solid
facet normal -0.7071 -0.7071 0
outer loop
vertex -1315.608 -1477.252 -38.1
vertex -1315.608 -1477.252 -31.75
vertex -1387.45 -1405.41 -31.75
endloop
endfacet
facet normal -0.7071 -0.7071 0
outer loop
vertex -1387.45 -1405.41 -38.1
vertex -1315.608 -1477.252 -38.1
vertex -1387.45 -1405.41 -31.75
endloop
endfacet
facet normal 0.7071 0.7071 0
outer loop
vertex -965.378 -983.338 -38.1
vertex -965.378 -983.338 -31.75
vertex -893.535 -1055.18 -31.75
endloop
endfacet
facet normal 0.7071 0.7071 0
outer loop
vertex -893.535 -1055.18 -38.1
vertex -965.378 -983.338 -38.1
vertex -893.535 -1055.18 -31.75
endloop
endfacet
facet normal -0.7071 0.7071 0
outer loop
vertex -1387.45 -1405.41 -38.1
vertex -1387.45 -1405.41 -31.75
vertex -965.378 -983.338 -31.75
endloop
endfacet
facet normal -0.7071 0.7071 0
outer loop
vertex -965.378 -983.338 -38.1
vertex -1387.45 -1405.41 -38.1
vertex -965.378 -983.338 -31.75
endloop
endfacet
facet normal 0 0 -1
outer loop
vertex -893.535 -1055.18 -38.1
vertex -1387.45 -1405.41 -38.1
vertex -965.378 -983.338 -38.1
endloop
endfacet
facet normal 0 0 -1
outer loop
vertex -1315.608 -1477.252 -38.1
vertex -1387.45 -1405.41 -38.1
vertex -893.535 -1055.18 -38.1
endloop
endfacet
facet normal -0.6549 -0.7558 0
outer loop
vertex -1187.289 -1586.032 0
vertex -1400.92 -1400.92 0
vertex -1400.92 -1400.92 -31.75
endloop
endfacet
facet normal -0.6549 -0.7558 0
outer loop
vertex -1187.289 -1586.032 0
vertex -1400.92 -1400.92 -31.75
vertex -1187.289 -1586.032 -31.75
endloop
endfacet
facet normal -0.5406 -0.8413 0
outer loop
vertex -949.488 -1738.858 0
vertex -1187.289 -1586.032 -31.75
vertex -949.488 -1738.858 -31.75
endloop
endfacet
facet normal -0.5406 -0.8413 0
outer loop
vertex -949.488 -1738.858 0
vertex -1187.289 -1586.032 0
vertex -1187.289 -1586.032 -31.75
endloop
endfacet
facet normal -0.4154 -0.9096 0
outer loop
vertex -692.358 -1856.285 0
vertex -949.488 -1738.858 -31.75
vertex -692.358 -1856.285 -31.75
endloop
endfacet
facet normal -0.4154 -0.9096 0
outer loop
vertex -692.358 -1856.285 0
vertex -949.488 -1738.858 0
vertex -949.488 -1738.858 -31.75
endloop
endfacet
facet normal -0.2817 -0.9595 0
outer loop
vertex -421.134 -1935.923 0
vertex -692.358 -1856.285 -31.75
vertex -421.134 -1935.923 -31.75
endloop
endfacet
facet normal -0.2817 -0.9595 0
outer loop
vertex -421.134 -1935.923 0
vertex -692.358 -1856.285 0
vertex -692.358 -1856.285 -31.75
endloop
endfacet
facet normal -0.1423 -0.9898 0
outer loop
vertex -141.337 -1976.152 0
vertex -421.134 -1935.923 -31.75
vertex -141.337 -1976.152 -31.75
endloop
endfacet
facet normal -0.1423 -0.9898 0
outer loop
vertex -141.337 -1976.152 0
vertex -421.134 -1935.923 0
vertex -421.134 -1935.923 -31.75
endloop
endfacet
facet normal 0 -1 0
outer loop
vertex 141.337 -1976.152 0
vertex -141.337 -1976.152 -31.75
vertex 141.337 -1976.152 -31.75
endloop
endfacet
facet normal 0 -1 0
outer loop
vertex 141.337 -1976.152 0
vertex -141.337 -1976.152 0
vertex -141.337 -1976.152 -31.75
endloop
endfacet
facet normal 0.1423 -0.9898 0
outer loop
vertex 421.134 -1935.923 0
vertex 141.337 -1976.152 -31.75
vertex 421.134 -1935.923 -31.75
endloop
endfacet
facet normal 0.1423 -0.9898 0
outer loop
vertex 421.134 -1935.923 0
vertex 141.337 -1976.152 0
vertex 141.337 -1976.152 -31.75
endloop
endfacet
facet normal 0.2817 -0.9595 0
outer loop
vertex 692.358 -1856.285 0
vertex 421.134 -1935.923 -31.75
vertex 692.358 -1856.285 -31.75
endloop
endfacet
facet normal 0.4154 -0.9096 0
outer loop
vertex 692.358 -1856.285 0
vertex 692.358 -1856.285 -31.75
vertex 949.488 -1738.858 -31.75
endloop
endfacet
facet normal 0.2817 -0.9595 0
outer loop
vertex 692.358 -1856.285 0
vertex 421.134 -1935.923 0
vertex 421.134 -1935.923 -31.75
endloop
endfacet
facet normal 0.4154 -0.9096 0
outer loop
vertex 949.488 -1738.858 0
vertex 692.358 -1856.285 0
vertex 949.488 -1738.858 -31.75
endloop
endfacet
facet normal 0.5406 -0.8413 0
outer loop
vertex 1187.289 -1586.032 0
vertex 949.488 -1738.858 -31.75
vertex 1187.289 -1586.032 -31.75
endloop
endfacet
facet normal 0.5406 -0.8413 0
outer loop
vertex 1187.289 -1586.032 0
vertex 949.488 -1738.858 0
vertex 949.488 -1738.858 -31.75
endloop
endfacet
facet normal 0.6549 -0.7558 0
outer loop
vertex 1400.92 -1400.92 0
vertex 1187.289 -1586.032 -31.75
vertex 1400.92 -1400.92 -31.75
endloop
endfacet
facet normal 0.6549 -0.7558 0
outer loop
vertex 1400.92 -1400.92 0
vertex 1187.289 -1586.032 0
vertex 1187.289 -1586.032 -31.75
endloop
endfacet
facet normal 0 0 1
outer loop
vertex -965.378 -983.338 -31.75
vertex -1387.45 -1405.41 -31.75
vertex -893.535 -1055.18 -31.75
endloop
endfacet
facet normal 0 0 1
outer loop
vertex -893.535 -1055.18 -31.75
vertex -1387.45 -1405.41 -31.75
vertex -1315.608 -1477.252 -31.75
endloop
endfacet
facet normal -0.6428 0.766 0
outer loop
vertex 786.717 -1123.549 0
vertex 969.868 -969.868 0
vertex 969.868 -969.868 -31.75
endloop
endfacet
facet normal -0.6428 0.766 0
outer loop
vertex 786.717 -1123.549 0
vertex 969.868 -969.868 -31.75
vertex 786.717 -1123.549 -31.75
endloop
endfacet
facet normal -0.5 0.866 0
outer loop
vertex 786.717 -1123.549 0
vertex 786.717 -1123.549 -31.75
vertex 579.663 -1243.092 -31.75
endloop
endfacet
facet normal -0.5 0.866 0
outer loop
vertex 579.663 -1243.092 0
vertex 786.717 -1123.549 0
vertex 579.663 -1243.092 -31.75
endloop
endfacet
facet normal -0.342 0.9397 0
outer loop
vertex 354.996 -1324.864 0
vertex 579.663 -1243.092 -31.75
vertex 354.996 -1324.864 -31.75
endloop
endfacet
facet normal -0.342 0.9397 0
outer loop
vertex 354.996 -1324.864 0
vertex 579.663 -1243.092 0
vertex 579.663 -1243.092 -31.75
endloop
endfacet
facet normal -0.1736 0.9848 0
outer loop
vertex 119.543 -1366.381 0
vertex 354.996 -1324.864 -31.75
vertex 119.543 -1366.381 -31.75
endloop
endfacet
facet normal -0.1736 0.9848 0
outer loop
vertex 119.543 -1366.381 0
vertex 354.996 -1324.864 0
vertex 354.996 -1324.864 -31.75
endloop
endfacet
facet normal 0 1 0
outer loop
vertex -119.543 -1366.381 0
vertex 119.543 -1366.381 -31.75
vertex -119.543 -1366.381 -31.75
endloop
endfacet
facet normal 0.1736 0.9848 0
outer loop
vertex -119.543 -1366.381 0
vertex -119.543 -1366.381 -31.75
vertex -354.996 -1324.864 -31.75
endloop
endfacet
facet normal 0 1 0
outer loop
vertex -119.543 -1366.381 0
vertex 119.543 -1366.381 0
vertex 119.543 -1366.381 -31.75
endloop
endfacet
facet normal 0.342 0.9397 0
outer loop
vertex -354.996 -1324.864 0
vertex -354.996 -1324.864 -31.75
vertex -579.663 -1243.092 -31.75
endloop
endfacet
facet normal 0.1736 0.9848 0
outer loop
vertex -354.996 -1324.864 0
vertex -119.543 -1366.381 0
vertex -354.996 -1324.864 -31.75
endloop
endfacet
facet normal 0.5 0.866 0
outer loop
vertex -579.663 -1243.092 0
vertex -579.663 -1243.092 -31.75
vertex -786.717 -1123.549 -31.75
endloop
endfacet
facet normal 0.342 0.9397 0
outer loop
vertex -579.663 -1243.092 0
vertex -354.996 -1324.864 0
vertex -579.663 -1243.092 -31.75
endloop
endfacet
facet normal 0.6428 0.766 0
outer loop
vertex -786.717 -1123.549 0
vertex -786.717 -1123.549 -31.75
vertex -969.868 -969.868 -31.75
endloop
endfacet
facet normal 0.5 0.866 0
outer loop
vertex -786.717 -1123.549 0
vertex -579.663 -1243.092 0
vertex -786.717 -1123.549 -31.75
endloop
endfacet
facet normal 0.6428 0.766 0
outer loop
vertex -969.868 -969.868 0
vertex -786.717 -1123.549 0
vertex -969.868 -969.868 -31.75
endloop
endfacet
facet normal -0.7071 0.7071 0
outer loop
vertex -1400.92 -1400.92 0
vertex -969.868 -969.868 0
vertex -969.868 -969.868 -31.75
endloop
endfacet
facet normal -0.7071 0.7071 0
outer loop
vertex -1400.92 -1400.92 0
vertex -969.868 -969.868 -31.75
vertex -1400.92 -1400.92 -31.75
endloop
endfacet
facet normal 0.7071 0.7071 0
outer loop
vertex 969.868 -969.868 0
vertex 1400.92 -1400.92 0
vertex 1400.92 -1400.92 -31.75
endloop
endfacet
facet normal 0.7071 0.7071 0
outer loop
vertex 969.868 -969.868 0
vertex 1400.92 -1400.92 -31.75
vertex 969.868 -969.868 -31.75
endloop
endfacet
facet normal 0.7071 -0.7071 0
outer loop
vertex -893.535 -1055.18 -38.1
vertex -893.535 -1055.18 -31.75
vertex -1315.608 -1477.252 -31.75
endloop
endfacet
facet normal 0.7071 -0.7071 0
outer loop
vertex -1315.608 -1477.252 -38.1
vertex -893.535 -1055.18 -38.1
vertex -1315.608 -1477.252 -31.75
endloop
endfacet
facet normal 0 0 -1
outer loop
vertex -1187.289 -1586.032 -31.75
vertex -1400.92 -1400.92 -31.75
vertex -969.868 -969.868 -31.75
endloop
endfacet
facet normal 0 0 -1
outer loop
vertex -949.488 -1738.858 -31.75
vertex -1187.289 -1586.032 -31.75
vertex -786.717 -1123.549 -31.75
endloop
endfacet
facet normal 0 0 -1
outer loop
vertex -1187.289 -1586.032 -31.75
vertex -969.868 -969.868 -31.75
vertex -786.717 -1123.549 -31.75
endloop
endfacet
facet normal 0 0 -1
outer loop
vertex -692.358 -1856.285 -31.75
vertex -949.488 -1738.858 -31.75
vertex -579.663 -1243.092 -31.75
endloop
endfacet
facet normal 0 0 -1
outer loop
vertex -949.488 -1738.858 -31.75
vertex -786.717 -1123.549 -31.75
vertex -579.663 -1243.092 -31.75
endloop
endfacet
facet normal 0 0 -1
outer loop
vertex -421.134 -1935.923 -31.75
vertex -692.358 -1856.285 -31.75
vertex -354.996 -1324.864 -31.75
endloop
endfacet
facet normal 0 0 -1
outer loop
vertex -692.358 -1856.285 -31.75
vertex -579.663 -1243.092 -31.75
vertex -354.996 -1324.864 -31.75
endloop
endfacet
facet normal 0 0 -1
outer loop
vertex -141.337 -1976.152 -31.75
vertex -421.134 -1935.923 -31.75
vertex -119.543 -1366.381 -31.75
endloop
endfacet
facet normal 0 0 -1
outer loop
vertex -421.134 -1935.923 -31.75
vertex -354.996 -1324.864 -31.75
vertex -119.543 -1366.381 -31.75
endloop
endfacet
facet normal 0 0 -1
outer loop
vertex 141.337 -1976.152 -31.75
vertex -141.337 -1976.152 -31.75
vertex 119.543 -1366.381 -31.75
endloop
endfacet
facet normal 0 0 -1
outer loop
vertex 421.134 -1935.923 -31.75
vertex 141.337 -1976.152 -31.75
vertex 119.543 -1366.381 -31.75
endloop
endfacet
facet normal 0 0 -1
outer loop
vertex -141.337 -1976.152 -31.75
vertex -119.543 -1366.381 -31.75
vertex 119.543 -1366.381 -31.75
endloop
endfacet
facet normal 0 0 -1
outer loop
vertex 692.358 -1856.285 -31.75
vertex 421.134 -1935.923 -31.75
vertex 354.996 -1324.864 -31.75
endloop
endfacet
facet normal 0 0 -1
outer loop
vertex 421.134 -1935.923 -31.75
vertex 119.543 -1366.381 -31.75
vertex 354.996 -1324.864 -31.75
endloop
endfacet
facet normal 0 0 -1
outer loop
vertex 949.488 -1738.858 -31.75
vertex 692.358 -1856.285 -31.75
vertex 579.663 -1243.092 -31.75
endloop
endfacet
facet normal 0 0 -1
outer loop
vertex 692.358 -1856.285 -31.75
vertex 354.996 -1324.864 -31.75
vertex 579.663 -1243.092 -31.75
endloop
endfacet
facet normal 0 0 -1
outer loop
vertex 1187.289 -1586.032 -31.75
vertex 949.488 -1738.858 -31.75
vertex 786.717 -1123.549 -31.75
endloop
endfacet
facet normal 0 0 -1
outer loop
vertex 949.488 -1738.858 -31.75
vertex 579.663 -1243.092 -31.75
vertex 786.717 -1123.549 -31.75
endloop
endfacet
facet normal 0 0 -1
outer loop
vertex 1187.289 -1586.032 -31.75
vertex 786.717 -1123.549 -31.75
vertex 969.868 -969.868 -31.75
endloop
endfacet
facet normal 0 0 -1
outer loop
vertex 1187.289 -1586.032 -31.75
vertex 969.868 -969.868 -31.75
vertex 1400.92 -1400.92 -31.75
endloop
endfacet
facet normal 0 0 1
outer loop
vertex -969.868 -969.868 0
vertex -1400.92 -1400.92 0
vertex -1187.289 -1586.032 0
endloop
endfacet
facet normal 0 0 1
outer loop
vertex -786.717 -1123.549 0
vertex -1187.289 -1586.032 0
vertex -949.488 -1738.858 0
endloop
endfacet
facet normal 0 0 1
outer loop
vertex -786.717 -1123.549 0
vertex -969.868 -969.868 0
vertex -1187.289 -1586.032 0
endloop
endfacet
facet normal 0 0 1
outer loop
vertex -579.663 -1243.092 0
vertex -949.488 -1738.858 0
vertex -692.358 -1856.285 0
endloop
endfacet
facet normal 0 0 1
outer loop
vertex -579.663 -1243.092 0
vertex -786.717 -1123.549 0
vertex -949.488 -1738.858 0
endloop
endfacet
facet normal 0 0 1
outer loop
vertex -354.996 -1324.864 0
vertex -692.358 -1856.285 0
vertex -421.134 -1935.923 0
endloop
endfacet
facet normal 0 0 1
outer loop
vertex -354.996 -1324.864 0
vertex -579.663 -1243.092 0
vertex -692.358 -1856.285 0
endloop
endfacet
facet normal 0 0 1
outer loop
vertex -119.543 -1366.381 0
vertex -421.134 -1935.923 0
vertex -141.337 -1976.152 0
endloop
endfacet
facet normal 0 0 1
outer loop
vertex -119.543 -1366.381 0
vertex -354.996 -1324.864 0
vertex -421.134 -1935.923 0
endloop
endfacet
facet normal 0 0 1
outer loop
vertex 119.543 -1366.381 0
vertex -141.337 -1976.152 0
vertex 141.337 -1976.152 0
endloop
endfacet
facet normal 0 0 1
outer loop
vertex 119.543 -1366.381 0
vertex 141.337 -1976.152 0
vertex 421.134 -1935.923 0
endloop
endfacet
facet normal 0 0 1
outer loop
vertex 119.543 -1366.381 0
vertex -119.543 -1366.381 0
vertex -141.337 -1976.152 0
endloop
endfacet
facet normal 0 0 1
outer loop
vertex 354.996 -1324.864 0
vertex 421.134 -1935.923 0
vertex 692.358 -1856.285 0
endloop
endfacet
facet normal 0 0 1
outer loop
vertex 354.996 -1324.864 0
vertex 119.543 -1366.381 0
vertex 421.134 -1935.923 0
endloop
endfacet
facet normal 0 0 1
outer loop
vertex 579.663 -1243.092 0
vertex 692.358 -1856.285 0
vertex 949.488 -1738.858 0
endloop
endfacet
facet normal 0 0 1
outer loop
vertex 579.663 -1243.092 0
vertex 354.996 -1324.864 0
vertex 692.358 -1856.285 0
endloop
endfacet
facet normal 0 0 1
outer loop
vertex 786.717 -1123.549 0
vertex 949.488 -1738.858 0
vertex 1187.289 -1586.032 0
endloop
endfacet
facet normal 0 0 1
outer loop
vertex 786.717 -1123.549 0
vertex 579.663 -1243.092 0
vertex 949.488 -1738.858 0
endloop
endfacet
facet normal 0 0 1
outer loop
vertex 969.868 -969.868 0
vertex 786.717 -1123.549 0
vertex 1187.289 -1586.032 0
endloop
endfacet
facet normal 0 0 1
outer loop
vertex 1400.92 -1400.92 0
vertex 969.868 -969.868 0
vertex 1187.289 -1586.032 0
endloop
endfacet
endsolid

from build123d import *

# Parameters (mm, degrees)
F1_DEPTH = 31.75
F3_DEPTH = 6.35


with BuildPart() as f1:
    # F0 (on Top) → F1 (new body)
    with BuildSketch(Plane.XY):
        with BuildLine():
            ThreePointArc((969.867661, -969.867661), (0, -1371.6), (-969.867661, -969.867661))
            Line((-969.867661, -969.867661), (-1400.919955, -1400.919955))
            ThreePointArc((-1400.919955, -1400.919955), (0, -1981.2), (1400.919955, -1400.919955))
            Line((1400.919955, -1400.919955), (969.867661, -969.867661))
        make_face()
    extrude(amount=-F1_DEPTH)


with BuildPart() as f3:
    # F2 (on face) → F3 (new body)
    with BuildSketch(Plane(origin=(0, 0, -31.75), x_dir=(1, 0, 0), z_dir=(0, 0, -1))):
        Polygon((-1387.449571, 1405.410083), (-965.377533, 983.338045), (-893.535484, 1055.180094), (-1315.607522, 1477.252132), align=None)
    extrude(amount=F3_DEPTH)


solid = Compound([f1.part, f3.part])
